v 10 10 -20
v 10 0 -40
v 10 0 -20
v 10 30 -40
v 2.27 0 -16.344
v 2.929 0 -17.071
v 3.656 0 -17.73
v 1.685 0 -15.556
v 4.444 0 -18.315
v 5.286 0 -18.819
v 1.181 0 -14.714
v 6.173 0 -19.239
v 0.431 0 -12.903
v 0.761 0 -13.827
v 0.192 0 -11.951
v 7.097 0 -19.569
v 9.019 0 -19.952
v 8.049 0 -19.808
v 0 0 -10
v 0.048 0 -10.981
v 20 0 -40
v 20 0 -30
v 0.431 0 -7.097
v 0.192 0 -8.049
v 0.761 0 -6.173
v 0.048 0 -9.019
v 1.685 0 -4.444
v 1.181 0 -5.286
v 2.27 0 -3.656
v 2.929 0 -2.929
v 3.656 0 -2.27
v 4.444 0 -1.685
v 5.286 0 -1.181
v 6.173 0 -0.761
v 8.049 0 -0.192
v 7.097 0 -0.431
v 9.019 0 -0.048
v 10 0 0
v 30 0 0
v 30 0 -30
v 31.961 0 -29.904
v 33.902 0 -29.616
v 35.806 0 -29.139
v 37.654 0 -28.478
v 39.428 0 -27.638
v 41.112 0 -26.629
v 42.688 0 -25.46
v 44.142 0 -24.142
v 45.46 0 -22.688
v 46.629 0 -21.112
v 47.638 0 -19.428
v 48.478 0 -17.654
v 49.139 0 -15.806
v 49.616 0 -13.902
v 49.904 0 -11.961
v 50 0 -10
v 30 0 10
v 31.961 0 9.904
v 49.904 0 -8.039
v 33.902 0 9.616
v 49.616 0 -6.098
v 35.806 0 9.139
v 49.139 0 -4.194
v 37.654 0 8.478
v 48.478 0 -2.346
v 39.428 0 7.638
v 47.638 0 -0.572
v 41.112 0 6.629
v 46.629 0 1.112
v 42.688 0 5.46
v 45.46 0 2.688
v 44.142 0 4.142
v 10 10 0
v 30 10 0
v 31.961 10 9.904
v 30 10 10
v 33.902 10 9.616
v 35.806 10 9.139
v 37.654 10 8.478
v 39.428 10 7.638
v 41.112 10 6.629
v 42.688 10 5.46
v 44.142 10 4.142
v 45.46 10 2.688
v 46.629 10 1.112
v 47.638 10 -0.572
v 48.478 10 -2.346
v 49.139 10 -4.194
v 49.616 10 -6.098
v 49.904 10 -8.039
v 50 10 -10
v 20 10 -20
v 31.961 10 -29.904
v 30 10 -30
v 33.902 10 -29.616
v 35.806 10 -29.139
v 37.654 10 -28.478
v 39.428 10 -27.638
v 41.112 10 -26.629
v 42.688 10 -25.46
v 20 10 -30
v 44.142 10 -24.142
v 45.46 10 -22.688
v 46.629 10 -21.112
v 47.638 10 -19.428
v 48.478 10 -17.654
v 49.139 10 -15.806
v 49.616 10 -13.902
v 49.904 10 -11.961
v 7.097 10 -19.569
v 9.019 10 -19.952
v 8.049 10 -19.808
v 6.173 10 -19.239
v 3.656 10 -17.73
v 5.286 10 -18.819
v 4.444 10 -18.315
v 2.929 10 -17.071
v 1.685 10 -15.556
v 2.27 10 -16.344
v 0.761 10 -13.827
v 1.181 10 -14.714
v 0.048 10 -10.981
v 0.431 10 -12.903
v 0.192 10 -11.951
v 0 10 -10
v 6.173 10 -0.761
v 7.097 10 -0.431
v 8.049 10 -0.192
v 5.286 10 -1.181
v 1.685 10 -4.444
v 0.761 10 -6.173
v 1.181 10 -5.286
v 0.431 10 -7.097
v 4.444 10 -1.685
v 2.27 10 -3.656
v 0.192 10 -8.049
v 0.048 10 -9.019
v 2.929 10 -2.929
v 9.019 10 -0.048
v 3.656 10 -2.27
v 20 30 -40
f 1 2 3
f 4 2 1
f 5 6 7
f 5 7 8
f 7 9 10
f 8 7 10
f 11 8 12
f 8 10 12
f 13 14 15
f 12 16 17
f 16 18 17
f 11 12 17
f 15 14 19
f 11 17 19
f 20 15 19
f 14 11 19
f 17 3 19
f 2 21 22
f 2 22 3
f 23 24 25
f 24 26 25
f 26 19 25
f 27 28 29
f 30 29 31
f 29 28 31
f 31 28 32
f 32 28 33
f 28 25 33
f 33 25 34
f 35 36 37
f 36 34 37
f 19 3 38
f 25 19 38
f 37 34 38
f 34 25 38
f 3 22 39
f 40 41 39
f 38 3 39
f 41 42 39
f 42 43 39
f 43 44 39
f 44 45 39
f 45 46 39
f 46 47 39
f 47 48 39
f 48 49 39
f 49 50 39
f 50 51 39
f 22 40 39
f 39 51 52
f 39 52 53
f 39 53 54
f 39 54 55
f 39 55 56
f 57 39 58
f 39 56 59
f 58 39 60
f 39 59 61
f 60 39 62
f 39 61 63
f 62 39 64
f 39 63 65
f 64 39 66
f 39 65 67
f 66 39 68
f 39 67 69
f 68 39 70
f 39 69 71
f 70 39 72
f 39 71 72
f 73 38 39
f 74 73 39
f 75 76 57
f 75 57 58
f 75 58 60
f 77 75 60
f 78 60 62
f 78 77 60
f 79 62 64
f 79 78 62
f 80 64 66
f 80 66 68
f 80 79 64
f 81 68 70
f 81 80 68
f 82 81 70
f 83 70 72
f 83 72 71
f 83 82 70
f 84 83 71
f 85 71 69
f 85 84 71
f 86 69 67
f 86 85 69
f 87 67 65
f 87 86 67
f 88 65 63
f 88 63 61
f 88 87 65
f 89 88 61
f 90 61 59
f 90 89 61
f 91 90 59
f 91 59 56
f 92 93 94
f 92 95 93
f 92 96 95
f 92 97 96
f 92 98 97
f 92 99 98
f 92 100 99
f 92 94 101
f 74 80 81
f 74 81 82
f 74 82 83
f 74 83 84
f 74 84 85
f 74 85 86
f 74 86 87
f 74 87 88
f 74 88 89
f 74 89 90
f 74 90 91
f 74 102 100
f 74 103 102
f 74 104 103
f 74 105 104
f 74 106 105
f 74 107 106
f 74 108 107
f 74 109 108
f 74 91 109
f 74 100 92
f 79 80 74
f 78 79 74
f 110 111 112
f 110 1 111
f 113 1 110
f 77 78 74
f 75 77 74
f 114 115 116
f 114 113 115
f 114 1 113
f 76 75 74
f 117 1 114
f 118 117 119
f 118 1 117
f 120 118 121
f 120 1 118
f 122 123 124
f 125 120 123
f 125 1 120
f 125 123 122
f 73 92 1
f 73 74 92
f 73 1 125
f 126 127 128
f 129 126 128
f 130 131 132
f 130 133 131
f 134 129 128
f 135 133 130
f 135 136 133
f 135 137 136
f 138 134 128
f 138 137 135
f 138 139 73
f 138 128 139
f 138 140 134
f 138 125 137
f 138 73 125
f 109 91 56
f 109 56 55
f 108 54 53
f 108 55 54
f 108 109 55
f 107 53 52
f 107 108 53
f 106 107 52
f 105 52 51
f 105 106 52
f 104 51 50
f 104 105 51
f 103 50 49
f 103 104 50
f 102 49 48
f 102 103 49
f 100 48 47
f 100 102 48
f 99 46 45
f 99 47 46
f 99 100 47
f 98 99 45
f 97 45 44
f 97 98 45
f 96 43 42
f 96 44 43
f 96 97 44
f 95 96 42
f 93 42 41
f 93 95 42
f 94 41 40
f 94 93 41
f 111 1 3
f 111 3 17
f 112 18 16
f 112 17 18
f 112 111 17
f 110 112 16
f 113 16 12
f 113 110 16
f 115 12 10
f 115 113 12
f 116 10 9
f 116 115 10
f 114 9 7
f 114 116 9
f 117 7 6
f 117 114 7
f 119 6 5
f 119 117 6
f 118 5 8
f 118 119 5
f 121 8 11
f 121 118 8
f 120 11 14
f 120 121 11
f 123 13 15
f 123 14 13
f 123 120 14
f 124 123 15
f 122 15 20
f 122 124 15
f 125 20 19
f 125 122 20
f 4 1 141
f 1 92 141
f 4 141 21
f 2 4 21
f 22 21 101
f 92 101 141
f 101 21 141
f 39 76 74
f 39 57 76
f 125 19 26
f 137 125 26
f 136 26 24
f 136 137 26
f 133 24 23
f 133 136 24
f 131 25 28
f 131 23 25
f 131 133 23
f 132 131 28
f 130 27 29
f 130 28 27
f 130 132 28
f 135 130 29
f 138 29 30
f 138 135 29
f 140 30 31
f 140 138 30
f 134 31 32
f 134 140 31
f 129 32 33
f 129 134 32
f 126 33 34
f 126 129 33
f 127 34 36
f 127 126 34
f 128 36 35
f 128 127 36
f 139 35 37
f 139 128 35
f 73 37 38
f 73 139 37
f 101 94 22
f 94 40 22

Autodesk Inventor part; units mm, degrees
ref_plane "YZ Plane" through (0, 0, 0) normal (1, 0, 0) x (0, 1, 0)
ref_plane "XZ Plane" through (0, 0, 0) normal (0, 1, 0) x (-1, 0, 0)
ref_plane "XY Plane" through (0, 0, 0) normal (0, 0, 1) x (1, 0, 0)
sketch "草圖1" plane through (0, 0, 0) normal (0, 1, 0) x (-1, 0, 0)
  line L0 (0, 0) -> (-20, 0)
  line L1 (-20, 0) -> (-20, -20)
  line L2 (-20, -20) -> (0, -20)
  line L3 (0, -20) -> (0, 0)
  line L4 (-20, 0) -> (-30, 0)
  line L5 (-30, 0) -> (-30, -30)
  line L6 (-30, -30) -> (-20, -30)
  line L7 (-20, -30) -> (-20, 0)
  line L8 (-30, -30) -> (-50, -30)
  line L9 (-50, -30) -> (-50, 10)
  line L10 (-50, 10) -> (-30, 10)
  line L11 (-30, 10) -> (-30, -30)
  dimension "d0" = 20
  dimension "d1" = 20
  dimension "d2" = 20
  dimension "d3" = 10
  dimension "d4" = 30
  dimension "d5" = 40
extrude "擠出1" add sketch "草圖1" along normal blind 10
fillet "圓角1" radius 20 2 edges at (50, 5, 10) (50, 5, -30)
fillet "圓角2" radius 10 2 edges at (0, 5, -20) (0, 5, 0)
sketch "草圖2" plane through (20, 0, -30) normal (-1, 0, 0) x (0, 0, 1)
  line L0 (10, 0) -> (10, 10) projected
  line L1 (10, 10) -> (-10, 30)
  line L2 (-10, 30) -> (-10, 0)
  line L3 (-10, 0) -> (10, 0)
  point P0 (30, 0)
  dimension "d10" = 20
  dimension "d11" = 30
extrude "擠出2" add sketch "草圖2" along normal blind 10
properties part number "44"
